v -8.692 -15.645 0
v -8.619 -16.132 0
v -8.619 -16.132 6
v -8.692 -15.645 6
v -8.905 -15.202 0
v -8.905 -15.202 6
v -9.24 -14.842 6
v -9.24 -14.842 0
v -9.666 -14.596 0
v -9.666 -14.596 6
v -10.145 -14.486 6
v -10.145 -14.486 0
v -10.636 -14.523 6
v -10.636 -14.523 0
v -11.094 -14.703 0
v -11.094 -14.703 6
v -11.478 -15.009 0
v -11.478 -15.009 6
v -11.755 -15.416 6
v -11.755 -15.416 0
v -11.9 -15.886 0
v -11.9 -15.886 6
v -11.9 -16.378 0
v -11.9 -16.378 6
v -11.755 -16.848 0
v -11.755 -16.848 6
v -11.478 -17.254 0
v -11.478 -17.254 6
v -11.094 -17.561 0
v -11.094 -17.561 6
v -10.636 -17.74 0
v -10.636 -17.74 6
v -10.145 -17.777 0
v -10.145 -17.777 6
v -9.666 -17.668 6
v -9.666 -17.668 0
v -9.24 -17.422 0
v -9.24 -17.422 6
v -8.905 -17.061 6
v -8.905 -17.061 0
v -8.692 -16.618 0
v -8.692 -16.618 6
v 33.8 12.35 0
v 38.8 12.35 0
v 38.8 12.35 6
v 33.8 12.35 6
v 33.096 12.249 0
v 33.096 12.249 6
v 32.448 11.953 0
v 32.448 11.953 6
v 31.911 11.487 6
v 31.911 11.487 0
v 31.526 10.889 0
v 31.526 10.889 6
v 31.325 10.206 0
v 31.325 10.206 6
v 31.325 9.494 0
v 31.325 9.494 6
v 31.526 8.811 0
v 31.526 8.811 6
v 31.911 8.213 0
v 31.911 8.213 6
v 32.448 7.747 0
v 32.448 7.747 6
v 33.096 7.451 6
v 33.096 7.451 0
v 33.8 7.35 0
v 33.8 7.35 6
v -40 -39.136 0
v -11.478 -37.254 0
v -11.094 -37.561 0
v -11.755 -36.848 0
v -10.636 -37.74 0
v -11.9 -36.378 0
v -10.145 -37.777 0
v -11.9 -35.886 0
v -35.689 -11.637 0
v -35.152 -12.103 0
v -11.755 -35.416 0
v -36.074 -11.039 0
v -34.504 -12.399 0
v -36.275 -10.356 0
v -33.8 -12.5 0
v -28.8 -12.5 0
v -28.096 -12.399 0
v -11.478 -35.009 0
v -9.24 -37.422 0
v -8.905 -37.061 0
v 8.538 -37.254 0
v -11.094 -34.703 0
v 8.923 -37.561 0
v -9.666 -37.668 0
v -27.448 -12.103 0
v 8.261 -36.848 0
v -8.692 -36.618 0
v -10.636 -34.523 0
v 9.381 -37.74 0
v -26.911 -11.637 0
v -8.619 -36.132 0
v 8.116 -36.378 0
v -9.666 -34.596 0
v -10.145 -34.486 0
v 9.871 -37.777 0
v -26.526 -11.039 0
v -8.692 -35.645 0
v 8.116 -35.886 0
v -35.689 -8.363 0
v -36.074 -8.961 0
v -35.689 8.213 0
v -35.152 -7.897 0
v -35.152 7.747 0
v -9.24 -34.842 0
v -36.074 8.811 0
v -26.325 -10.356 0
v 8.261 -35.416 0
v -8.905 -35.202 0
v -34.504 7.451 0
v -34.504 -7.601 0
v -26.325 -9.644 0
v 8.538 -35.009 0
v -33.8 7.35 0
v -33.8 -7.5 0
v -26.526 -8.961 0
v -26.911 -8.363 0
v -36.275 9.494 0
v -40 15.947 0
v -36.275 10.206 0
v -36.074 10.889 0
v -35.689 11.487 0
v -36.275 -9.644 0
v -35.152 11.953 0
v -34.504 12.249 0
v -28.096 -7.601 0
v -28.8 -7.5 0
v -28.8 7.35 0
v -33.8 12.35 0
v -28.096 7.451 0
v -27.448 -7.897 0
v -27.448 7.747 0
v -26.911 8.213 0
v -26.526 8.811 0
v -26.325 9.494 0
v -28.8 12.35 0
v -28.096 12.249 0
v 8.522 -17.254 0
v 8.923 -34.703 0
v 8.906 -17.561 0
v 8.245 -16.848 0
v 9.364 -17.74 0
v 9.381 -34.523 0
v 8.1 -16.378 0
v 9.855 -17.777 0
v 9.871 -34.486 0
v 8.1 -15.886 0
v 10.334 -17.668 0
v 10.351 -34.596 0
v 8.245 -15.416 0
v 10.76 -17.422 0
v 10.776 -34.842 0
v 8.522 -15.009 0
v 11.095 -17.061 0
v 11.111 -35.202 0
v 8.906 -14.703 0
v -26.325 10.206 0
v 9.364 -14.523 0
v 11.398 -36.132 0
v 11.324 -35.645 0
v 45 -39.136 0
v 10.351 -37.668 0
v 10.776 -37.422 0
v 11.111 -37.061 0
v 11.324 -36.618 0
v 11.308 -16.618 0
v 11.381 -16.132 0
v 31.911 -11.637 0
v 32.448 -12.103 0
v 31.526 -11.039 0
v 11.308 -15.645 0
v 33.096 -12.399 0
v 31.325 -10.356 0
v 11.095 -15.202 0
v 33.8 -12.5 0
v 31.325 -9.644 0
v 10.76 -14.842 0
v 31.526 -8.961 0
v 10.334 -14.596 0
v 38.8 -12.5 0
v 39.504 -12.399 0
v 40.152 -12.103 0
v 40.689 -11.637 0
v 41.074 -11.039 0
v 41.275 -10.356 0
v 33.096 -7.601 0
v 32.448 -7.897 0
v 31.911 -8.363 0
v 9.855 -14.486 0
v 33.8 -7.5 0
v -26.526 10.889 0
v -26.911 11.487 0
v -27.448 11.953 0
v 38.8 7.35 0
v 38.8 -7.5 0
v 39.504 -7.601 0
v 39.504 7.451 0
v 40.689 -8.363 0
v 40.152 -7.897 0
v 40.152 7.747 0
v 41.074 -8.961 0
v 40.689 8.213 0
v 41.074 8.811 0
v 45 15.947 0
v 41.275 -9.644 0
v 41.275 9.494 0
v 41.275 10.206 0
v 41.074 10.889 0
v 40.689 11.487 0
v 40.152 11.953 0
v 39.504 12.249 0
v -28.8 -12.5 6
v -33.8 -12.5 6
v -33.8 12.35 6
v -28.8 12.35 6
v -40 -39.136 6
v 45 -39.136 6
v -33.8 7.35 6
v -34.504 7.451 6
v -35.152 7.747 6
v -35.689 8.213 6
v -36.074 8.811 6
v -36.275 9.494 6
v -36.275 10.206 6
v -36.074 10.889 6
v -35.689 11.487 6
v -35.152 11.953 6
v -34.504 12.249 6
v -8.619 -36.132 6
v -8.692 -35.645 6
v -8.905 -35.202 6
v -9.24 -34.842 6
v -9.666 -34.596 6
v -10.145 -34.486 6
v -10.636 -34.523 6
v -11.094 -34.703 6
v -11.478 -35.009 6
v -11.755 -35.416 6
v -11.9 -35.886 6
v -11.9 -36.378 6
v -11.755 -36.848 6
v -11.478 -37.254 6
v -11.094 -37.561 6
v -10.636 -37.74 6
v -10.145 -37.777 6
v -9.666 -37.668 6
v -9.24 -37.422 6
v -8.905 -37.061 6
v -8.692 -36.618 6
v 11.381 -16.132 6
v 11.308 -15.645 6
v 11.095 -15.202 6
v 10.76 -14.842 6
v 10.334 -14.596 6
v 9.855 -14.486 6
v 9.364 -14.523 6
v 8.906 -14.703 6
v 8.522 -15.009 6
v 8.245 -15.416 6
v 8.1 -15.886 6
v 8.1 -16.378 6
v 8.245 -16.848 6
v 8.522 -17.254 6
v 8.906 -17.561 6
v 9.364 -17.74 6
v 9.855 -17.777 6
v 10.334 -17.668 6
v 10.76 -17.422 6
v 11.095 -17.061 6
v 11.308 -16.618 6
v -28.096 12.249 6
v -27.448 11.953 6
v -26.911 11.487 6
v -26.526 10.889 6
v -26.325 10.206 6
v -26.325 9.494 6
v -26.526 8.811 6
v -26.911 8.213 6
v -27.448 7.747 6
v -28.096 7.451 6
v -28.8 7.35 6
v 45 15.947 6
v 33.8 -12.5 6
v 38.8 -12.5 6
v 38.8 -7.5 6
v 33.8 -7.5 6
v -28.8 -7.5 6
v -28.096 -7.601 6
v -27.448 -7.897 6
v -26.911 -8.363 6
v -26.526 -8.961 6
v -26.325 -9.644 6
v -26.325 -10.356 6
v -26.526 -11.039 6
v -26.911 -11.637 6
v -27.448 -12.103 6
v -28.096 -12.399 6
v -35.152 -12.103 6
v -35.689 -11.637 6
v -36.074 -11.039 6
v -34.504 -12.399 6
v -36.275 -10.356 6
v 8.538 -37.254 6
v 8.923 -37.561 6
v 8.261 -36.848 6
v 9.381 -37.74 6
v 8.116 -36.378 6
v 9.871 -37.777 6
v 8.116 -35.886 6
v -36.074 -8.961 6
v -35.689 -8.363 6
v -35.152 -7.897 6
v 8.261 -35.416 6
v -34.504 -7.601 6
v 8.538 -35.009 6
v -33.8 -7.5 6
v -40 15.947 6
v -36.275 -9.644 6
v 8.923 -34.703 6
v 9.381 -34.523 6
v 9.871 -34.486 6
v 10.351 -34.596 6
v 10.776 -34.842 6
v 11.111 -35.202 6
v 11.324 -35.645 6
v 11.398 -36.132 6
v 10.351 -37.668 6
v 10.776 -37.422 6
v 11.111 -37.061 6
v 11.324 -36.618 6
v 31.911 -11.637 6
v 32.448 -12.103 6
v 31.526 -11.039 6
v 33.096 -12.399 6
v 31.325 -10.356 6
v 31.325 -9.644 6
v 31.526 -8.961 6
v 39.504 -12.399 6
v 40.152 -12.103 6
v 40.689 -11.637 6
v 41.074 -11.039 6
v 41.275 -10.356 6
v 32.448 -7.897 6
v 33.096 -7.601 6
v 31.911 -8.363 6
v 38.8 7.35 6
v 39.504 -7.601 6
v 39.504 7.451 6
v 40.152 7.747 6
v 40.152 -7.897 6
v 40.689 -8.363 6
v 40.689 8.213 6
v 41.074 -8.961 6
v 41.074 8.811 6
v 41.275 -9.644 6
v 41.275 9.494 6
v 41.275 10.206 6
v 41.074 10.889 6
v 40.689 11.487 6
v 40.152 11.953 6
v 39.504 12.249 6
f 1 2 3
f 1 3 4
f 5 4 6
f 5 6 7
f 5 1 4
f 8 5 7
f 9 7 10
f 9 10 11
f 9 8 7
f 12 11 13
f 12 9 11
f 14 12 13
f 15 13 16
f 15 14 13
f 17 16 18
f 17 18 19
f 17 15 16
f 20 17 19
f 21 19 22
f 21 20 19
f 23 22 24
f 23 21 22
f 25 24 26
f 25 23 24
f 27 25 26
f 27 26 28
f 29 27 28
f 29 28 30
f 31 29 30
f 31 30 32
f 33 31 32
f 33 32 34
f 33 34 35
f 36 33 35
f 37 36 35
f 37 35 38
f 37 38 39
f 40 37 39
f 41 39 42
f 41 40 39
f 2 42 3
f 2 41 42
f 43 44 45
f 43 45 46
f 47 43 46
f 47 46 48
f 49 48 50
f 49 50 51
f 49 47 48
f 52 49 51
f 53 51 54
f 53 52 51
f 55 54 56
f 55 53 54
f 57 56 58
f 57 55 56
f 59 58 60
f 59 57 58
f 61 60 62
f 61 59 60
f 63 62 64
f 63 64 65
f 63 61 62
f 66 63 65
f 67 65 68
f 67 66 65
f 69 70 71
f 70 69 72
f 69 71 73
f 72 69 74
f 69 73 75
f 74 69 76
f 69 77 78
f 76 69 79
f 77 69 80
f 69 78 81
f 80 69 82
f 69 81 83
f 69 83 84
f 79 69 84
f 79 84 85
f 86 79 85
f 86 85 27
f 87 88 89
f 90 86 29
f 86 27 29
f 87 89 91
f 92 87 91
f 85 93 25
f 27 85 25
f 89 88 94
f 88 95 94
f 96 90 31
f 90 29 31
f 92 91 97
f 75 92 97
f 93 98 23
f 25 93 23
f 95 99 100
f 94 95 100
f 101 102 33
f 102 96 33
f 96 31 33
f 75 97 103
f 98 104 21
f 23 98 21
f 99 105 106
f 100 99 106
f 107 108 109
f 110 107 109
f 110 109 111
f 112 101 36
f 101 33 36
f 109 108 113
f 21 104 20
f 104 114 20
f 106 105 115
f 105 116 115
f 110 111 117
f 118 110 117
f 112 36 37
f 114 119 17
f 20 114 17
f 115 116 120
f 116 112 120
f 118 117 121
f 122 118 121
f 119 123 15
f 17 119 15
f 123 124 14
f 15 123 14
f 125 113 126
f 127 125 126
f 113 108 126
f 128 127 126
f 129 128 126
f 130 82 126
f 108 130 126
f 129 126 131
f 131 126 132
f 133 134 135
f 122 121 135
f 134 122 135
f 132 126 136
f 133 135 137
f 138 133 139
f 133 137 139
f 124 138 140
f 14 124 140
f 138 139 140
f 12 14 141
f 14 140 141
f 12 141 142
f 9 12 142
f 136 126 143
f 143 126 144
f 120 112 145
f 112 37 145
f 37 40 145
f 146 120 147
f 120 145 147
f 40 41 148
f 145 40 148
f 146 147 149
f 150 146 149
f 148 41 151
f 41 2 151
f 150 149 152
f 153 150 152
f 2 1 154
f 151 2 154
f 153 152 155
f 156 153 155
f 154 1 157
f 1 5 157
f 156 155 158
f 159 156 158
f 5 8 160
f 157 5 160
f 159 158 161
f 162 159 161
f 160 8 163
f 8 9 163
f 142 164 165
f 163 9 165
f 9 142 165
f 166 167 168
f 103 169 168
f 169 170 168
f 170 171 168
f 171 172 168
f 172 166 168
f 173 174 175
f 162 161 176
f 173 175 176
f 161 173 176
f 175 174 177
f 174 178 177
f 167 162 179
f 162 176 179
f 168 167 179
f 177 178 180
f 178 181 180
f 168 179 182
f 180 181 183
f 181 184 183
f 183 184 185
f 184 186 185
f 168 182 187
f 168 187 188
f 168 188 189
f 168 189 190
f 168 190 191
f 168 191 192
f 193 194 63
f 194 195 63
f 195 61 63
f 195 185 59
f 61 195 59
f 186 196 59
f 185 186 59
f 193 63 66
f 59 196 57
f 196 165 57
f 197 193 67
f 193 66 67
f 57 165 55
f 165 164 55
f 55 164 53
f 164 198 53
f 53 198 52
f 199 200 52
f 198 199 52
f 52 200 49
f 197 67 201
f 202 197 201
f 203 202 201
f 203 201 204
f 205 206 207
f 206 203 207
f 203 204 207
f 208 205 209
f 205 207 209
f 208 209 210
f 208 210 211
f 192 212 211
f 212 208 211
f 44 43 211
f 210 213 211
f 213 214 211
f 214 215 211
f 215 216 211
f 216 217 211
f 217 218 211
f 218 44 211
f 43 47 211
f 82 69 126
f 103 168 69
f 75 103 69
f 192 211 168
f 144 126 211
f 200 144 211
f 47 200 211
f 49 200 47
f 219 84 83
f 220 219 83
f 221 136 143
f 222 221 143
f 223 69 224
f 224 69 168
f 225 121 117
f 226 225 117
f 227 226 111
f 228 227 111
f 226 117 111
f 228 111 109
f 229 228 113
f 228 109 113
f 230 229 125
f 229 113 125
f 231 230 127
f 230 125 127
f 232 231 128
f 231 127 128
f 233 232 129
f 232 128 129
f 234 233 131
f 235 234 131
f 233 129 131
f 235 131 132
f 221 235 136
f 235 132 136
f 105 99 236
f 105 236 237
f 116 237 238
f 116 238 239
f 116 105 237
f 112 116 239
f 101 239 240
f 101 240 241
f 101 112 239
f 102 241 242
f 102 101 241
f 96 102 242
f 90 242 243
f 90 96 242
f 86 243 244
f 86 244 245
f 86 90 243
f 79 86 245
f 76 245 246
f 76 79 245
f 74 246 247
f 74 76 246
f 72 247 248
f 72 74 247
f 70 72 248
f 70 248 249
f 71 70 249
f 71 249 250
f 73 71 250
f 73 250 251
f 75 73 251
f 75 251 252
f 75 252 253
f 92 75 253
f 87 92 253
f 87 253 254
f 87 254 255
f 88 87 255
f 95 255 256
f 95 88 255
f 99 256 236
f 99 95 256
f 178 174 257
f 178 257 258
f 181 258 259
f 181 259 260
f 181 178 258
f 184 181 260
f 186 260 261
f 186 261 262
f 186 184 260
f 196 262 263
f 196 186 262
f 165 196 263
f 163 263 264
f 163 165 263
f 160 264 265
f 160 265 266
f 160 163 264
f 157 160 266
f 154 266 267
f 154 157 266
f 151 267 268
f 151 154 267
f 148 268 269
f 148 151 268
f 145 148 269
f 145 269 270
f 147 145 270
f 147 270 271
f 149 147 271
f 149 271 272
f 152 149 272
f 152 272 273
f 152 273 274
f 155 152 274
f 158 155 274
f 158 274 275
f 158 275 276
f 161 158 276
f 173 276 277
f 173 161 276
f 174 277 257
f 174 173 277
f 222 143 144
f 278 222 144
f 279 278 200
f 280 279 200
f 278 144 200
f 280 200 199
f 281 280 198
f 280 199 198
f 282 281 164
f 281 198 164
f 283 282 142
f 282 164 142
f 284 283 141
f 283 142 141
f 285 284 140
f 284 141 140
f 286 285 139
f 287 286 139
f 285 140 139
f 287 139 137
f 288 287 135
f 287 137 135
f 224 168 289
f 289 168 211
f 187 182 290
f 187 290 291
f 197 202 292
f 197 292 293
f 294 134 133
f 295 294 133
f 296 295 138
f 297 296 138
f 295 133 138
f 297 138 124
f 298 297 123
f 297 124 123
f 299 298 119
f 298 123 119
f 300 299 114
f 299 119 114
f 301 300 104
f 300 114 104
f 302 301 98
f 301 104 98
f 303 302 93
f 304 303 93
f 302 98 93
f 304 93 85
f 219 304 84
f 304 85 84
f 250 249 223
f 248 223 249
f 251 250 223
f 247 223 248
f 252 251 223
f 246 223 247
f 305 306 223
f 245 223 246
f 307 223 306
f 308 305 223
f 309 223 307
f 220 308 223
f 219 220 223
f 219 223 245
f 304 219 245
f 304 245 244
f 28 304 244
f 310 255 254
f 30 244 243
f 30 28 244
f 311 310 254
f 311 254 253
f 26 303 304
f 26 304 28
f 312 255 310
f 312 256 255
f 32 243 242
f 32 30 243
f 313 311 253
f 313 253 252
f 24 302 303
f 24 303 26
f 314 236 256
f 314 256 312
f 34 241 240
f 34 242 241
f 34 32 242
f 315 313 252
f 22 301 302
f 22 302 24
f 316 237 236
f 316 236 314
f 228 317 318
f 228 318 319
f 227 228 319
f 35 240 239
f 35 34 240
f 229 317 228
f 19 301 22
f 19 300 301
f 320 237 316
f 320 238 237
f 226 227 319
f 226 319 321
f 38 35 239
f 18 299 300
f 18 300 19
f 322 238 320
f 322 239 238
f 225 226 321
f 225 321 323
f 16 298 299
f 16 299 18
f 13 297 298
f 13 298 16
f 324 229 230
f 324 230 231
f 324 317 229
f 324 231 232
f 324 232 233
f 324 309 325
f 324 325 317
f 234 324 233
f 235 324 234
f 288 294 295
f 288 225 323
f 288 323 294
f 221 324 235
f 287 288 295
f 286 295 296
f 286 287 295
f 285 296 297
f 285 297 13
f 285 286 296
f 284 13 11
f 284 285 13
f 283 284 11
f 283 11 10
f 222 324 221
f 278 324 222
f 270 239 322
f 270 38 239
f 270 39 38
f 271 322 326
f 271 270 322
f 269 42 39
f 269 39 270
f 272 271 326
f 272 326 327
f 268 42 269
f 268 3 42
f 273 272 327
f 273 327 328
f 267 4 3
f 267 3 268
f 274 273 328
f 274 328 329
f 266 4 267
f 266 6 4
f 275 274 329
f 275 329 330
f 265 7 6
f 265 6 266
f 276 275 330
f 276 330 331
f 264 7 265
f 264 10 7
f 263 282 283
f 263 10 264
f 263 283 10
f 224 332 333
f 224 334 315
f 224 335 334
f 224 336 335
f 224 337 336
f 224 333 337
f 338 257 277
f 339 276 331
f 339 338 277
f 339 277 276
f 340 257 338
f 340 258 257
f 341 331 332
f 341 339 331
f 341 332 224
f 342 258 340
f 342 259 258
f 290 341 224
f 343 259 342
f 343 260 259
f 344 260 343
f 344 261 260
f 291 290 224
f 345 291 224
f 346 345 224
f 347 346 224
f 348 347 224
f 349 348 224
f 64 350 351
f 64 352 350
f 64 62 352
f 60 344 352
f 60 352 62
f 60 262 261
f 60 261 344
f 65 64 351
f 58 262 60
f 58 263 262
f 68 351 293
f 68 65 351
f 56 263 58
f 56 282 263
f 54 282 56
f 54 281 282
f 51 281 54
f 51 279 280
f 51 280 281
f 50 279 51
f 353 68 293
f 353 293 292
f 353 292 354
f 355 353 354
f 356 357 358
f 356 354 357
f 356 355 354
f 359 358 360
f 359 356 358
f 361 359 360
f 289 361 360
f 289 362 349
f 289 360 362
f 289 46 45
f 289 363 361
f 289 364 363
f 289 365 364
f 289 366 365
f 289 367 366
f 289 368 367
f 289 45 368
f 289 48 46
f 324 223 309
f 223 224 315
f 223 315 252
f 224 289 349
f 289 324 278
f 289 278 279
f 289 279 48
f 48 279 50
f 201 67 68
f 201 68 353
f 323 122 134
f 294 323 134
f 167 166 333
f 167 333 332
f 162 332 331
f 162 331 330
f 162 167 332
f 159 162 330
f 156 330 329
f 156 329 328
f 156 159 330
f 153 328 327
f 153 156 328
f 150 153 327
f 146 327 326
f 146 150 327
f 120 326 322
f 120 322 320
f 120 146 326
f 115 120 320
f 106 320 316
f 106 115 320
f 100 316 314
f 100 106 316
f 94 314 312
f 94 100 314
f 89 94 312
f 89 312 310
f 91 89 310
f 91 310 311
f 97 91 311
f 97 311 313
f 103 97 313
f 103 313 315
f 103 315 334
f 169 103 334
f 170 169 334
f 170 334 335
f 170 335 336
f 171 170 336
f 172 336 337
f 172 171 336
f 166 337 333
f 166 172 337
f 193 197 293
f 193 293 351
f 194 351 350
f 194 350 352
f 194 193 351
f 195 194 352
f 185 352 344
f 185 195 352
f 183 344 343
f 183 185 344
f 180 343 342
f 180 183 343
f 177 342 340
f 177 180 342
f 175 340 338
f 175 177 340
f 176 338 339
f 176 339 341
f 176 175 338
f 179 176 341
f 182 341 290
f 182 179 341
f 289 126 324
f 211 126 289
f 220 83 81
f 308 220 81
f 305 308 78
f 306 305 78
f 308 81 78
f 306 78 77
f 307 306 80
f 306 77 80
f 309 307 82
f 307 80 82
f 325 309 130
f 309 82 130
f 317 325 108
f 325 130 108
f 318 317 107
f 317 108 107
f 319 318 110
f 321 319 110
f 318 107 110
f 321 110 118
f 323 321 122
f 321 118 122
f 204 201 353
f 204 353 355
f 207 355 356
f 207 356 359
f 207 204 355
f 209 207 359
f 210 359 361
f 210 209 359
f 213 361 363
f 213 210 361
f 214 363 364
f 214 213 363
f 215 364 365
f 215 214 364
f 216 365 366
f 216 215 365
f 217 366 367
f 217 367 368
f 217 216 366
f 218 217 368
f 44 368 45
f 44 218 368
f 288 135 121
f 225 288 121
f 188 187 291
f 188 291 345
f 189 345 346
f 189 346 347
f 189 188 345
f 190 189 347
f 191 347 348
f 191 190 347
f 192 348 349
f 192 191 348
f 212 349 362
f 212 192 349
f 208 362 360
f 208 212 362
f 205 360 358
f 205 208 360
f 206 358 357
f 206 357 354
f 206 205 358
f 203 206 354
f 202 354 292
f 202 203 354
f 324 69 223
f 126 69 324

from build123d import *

# Parameters (mm, degrees)
SKETCH2_W           = 85
SKETCH2_H           = 55.083692651
SKETCH2_R           = 1.65
BOSS_EXTRUDE1_DEPTH = 6


with BuildPart() as part:
    # Sketch2 → Boss-Extrude1 (new body)
    with BuildSketch(Plane.XY):
        with Locations((2.5, -11.594499981)):
            Rectangle(SKETCH2_W, SKETCH2_H)
        with Locations((-10.268789461, -16.131613602)):
            Circle(SKETCH2_R, mode=Mode.SUBTRACT)
        with Locations((9.731210539, -16.131613602)):
            Circle(SKETCH2_R, mode=Mode.SUBTRACT)
        with Locations((-10.268789461, -36.131613602)):
            Circle(SKETCH2_R, mode=Mode.SUBTRACT)
        with Locations((9.747732282, -36.131613602)):
            Circle(SKETCH2_R, mode=Mode.SUBTRACT)
        with BuildLine():
            Line((-33.8, 12.35), (-28.8, 12.35))
            ThreePointArc((-28.8, 12.35), (-26.3, 9.85), (-28.8, 7.35))
            Line((-28.8, 7.35), (-33.8, 7.35))
            ThreePointArc((-33.8, 7.35), (-36.3, 9.85), (-33.8, 12.35))
        make_face(mode=Mode.SUBTRACT)
        with BuildLine():
            Line((-33.8, -7.5), (-28.8, -7.5))
            ThreePointArc((-28.8, -7.5), (-26.3, -10), (-28.8, -12.5))
            Line((-28.8, -12.5), (-33.8, -12.5))
            ThreePointArc((-33.8, -12.5), (-36.3, -10), (-33.8, -7.5))
        make_face(mode=Mode.SUBTRACT)
        with BuildLine():
            Line((38.8, 12.35), (33.8, 12.35))
            ThreePointArc((33.8, 12.35), (31.3, 9.85), (33.8, 7.35))
            Line((33.8, 7.35), (38.8, 7.35))
            ThreePointArc((38.8, 7.35), (41.3, 9.85), (38.8, 12.35))
        make_face(mode=Mode.SUBTRACT)
        with BuildLine():
            Line((38.8, -7.5), (33.8, -7.5))
            ThreePointArc((33.8, -7.5), (31.3, -10), (33.8, -12.5))
            Line((33.8, -12.5), (38.8, -12.5))
            ThreePointArc((38.8, -12.5), (41.3, -10), (38.8, -7.5))
        make_face(mode=Mode.SUBTRACT)
    extrude(amount=BOSS_EXTRUDE1_DEPTH)


solid = part.part
